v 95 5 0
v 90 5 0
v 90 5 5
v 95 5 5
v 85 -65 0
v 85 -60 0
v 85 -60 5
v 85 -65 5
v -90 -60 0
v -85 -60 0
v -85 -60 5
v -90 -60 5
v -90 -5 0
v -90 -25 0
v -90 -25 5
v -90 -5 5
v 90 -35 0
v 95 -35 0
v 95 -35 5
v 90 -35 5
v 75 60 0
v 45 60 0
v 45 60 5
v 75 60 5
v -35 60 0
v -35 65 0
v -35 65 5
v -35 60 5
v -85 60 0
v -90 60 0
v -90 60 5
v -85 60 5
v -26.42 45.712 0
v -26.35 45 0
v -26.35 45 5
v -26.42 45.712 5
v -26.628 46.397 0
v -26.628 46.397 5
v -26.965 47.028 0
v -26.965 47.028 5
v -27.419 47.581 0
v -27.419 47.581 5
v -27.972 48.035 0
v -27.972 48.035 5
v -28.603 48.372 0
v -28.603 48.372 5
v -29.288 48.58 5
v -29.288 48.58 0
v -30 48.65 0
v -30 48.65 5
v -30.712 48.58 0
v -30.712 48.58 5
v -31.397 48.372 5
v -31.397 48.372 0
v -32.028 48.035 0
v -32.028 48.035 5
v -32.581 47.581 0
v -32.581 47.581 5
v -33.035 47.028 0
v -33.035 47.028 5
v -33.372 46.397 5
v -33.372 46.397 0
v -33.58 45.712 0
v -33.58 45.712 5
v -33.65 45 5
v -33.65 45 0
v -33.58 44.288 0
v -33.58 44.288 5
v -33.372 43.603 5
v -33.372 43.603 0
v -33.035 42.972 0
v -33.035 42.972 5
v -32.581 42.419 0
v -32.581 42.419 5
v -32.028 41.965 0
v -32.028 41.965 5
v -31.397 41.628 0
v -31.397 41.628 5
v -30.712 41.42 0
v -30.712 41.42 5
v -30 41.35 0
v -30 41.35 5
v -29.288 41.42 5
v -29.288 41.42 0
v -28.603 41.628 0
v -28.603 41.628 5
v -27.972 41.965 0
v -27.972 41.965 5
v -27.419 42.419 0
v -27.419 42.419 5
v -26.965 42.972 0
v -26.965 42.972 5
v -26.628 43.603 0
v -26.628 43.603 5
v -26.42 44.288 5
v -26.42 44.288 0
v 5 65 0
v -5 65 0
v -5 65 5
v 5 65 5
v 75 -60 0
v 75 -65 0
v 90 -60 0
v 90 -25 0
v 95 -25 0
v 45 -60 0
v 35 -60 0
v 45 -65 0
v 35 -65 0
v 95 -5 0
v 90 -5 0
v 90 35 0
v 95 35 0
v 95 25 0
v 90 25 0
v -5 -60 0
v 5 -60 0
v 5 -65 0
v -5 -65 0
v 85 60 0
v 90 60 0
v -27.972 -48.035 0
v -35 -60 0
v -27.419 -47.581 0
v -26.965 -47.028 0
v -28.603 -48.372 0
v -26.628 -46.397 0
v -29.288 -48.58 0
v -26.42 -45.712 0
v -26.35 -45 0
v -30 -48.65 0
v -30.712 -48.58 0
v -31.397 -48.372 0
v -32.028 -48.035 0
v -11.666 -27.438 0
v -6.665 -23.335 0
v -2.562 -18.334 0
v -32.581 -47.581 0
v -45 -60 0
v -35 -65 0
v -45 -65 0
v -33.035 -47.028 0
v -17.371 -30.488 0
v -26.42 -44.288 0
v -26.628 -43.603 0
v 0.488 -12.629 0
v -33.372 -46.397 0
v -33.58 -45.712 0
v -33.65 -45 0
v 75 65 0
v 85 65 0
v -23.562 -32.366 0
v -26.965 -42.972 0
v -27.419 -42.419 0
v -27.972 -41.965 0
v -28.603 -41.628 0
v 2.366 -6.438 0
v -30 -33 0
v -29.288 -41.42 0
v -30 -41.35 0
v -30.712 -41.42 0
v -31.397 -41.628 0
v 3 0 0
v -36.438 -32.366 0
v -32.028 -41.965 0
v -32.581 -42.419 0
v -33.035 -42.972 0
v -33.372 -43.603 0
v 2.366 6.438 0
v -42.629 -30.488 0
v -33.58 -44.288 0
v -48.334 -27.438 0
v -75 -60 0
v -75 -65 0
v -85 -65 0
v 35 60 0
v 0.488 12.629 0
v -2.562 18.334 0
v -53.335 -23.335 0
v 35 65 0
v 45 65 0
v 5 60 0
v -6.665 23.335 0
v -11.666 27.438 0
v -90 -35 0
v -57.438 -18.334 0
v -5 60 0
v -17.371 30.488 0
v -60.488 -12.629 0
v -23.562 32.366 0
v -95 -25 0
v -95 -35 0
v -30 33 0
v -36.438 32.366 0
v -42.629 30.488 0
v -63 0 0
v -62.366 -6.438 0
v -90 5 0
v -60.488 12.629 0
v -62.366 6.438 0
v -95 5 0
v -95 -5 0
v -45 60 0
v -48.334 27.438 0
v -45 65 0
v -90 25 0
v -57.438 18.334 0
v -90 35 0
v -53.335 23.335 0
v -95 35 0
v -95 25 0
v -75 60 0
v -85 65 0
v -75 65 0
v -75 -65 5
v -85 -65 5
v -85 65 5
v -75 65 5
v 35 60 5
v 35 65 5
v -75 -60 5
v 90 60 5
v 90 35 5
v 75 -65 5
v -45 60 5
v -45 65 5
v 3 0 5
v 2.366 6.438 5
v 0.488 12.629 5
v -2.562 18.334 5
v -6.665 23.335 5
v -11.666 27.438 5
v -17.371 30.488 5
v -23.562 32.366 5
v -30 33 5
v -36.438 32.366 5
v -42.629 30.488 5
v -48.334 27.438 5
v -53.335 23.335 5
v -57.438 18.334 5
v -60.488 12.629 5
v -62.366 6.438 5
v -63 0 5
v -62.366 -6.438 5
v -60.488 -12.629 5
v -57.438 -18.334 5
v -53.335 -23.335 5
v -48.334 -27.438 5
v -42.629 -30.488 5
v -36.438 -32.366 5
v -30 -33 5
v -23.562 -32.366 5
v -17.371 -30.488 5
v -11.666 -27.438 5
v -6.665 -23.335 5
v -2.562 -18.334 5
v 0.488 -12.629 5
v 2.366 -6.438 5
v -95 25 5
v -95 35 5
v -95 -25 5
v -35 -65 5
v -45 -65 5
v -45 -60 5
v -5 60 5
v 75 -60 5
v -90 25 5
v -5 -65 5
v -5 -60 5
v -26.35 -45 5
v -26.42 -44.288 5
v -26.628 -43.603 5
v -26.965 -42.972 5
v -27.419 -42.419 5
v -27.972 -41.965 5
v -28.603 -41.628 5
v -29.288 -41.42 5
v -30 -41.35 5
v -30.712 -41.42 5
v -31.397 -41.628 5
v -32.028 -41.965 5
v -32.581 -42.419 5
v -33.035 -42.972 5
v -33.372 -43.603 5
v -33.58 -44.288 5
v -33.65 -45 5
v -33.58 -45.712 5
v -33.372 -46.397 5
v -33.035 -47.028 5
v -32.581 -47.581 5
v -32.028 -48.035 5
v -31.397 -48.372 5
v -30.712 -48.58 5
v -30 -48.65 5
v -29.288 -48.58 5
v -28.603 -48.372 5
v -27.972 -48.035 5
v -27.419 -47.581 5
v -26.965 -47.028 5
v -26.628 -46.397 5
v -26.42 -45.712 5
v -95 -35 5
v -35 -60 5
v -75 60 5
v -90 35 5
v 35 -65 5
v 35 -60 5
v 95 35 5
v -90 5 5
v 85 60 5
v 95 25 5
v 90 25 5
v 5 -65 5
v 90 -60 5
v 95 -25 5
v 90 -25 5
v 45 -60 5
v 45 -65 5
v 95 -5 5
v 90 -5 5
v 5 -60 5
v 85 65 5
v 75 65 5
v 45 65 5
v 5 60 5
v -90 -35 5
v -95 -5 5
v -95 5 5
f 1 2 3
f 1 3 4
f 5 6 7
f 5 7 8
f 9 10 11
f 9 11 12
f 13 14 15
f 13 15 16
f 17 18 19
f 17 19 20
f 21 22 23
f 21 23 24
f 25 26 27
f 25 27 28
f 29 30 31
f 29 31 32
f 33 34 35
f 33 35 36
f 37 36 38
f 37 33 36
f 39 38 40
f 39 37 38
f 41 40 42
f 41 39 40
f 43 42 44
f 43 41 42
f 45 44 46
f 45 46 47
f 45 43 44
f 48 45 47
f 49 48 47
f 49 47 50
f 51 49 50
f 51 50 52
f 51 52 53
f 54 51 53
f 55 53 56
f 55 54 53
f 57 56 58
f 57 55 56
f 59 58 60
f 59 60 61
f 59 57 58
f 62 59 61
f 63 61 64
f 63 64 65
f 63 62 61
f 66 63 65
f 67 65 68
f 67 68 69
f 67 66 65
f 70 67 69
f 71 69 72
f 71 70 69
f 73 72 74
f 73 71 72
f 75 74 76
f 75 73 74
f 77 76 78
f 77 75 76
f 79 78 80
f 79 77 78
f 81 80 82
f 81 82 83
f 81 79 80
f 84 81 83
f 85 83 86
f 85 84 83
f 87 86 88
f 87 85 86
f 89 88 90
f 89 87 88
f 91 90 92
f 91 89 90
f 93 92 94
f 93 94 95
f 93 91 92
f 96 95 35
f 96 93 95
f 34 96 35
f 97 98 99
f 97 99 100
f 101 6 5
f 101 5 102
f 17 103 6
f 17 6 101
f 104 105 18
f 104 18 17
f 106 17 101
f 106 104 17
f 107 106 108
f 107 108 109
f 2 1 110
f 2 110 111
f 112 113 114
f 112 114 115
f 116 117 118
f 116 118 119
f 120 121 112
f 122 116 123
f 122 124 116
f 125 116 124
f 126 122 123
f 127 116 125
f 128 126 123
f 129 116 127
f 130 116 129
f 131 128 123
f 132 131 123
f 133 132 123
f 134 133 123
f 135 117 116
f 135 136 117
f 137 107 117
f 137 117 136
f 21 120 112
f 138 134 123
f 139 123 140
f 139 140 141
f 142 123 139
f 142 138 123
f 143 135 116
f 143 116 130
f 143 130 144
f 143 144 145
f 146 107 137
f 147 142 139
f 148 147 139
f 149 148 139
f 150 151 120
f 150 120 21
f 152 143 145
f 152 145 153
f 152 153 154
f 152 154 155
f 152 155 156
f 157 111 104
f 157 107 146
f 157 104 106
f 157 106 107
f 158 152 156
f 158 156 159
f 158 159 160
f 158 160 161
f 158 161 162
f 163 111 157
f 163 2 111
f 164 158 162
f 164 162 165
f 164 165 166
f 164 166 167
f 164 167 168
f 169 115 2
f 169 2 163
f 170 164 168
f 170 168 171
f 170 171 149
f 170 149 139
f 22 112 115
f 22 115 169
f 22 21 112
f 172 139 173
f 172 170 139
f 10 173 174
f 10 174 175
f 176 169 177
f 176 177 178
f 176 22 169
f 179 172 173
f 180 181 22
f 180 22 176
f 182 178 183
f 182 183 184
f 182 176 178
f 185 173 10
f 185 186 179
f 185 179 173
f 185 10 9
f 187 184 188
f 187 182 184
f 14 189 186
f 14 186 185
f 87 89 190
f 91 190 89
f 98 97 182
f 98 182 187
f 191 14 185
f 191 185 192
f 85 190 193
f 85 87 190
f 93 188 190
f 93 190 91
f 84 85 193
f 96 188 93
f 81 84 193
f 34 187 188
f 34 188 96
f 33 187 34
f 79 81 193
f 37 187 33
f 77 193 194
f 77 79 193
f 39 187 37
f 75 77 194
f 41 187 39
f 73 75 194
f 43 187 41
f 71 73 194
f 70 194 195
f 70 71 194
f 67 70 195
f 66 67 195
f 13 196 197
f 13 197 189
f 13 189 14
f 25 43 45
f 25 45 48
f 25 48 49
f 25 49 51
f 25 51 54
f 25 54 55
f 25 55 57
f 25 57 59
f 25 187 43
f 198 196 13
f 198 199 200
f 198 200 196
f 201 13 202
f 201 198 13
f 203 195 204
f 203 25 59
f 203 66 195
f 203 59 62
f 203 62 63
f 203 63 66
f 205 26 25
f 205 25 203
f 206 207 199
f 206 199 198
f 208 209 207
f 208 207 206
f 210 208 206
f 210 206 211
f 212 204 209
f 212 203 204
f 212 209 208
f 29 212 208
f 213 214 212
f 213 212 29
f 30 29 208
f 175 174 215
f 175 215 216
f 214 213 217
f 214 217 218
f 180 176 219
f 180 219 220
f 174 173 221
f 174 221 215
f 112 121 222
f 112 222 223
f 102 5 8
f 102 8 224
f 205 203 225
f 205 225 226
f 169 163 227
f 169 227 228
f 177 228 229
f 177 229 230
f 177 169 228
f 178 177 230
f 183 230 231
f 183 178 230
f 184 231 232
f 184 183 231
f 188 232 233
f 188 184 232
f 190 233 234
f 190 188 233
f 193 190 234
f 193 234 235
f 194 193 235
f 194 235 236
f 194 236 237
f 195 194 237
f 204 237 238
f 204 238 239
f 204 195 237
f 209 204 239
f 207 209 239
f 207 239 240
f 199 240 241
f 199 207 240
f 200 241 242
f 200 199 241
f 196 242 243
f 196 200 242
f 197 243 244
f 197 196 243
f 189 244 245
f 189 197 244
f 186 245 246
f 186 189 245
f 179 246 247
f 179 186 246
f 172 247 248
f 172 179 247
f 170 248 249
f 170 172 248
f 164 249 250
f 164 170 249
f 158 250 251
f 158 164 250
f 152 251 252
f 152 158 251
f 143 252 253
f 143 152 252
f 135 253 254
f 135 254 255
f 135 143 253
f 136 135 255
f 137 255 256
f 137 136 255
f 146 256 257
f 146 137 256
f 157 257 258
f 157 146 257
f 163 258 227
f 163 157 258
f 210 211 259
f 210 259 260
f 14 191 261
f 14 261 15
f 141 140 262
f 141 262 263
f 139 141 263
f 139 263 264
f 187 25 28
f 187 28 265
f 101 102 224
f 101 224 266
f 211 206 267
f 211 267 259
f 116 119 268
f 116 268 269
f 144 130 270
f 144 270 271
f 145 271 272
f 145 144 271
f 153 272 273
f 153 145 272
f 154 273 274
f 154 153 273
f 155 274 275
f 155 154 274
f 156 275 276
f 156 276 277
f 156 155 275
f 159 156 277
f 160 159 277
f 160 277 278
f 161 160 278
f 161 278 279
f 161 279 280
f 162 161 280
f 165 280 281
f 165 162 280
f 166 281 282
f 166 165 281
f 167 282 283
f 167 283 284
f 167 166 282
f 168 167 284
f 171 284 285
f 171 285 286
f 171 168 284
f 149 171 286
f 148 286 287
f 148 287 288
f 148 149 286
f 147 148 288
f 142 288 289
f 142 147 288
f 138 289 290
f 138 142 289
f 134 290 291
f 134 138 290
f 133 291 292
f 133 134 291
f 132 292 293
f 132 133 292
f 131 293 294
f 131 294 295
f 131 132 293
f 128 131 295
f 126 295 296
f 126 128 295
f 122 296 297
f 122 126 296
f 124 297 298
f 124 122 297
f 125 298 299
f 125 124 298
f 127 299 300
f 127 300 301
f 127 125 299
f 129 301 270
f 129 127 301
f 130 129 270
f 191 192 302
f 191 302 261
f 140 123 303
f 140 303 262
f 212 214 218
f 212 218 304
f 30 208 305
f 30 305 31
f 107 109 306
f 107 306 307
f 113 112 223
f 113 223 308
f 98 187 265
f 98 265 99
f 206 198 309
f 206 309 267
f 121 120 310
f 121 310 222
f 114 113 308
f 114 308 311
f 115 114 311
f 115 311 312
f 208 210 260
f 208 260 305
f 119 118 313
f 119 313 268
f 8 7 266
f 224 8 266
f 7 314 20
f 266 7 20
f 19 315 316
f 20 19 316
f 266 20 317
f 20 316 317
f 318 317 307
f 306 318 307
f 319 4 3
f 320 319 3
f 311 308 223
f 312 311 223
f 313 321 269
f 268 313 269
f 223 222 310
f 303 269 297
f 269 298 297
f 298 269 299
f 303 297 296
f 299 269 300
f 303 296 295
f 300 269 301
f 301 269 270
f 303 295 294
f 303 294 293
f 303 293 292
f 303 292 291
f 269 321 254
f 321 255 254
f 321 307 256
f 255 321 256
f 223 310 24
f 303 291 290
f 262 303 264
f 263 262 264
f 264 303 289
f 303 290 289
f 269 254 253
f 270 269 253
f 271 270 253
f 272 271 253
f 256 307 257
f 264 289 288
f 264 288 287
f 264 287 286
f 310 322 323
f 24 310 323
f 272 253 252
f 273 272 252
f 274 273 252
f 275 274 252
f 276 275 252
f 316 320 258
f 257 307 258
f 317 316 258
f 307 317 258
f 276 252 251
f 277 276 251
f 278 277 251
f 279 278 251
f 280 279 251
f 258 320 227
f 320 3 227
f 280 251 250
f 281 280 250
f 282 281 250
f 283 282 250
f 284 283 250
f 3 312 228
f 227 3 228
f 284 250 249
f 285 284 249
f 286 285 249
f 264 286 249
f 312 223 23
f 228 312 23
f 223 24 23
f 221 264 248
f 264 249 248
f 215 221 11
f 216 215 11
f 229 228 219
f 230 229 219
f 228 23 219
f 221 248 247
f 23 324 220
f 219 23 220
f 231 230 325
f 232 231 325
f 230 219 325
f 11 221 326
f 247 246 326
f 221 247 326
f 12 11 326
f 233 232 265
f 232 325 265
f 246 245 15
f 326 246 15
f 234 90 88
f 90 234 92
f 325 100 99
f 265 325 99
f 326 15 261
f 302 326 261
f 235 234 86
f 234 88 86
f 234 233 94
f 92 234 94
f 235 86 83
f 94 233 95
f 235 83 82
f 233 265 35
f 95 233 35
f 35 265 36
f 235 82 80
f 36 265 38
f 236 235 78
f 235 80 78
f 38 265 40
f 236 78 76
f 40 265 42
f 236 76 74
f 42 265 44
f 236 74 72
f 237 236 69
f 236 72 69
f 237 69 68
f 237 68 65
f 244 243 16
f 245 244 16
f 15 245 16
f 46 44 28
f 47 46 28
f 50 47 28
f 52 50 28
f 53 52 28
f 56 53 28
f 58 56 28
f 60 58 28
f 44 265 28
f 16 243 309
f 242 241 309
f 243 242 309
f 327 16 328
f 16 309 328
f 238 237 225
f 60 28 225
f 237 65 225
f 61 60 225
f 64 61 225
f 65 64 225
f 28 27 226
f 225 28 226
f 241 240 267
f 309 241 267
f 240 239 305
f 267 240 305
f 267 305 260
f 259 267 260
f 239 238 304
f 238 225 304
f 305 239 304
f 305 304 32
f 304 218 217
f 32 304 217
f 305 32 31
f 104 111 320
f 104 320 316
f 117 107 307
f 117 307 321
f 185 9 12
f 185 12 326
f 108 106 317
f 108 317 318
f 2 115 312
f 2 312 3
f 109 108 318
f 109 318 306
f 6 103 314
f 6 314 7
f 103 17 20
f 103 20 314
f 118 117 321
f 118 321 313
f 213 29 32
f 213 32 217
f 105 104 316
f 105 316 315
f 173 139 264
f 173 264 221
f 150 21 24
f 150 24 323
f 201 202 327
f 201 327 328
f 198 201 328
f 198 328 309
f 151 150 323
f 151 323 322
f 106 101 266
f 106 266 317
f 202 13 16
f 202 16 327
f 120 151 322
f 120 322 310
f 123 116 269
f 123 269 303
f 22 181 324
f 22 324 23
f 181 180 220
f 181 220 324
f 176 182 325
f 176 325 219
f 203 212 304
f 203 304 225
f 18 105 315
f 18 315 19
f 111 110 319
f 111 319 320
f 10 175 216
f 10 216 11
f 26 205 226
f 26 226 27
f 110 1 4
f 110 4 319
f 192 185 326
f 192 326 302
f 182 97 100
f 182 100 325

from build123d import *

# Parameters (mm, degrees)
SKETCH1_R           = 33
SKETCH1_R_2         = 3.65
BOSS_EXTRUDE1_DEPTH = 5


with BuildPart() as part:
    # Sketch1 → Boss-Extrude1 (new body)
    with BuildSketch(Plane.XY):
        Polygon((-85, 60), (-85, 65), (-75, 65), (-75, 60), (-45, 60), (-45, 65), (-35, 65), (-35, 60), (-5, 60), (-5, 65), (5, 65), (5, 60), (35, 60), (35, 65), (45, 65), (45, 60), (75, 60), (75, 65), (85, 65), (85, 60), (90, 60), (90, 35), (95, 35), (95, 25), (90, 25), (90, 5), (95, 5), (95, -5), (90, -5), (90, -25), (95, -25), (95, -35), (90, -35), (90, -60), (85, -60), (85, -65), (75, -65), (75, -60), (45, -60), (45, -65), (35, -65), (35, -60), (5, -60), (5, -65), (-5, -65), (-5, -60), (-35, -60), (-35, -65), (-45, -65), (-45, -60), (-75, -60), (-75, -65), (-85, -65), (-85, -60), (-90, -60), (-90, -35), (-95, -35), (-95, -25), (-90, -25), (-90, -5), (-95, -5), (-95, 5), (-90, 5), (-90, 25), (-95, 25), (-95, 35), (-90, 35), (-90, 60), align=None)
        with Locations((-30, 0)):
            Circle(SKETCH1_R, mode=Mode.SUBTRACT)
        with Locations((-30, -45)):
            Circle(SKETCH1_R_2, mode=Mode.SUBTRACT)
        with Locations((-30, 45)):
            Circle(SKETCH1_R_2, mode=Mode.SUBTRACT)
    extrude(amount=BOSS_EXTRUDE1_DEPTH)


solid = part.part
